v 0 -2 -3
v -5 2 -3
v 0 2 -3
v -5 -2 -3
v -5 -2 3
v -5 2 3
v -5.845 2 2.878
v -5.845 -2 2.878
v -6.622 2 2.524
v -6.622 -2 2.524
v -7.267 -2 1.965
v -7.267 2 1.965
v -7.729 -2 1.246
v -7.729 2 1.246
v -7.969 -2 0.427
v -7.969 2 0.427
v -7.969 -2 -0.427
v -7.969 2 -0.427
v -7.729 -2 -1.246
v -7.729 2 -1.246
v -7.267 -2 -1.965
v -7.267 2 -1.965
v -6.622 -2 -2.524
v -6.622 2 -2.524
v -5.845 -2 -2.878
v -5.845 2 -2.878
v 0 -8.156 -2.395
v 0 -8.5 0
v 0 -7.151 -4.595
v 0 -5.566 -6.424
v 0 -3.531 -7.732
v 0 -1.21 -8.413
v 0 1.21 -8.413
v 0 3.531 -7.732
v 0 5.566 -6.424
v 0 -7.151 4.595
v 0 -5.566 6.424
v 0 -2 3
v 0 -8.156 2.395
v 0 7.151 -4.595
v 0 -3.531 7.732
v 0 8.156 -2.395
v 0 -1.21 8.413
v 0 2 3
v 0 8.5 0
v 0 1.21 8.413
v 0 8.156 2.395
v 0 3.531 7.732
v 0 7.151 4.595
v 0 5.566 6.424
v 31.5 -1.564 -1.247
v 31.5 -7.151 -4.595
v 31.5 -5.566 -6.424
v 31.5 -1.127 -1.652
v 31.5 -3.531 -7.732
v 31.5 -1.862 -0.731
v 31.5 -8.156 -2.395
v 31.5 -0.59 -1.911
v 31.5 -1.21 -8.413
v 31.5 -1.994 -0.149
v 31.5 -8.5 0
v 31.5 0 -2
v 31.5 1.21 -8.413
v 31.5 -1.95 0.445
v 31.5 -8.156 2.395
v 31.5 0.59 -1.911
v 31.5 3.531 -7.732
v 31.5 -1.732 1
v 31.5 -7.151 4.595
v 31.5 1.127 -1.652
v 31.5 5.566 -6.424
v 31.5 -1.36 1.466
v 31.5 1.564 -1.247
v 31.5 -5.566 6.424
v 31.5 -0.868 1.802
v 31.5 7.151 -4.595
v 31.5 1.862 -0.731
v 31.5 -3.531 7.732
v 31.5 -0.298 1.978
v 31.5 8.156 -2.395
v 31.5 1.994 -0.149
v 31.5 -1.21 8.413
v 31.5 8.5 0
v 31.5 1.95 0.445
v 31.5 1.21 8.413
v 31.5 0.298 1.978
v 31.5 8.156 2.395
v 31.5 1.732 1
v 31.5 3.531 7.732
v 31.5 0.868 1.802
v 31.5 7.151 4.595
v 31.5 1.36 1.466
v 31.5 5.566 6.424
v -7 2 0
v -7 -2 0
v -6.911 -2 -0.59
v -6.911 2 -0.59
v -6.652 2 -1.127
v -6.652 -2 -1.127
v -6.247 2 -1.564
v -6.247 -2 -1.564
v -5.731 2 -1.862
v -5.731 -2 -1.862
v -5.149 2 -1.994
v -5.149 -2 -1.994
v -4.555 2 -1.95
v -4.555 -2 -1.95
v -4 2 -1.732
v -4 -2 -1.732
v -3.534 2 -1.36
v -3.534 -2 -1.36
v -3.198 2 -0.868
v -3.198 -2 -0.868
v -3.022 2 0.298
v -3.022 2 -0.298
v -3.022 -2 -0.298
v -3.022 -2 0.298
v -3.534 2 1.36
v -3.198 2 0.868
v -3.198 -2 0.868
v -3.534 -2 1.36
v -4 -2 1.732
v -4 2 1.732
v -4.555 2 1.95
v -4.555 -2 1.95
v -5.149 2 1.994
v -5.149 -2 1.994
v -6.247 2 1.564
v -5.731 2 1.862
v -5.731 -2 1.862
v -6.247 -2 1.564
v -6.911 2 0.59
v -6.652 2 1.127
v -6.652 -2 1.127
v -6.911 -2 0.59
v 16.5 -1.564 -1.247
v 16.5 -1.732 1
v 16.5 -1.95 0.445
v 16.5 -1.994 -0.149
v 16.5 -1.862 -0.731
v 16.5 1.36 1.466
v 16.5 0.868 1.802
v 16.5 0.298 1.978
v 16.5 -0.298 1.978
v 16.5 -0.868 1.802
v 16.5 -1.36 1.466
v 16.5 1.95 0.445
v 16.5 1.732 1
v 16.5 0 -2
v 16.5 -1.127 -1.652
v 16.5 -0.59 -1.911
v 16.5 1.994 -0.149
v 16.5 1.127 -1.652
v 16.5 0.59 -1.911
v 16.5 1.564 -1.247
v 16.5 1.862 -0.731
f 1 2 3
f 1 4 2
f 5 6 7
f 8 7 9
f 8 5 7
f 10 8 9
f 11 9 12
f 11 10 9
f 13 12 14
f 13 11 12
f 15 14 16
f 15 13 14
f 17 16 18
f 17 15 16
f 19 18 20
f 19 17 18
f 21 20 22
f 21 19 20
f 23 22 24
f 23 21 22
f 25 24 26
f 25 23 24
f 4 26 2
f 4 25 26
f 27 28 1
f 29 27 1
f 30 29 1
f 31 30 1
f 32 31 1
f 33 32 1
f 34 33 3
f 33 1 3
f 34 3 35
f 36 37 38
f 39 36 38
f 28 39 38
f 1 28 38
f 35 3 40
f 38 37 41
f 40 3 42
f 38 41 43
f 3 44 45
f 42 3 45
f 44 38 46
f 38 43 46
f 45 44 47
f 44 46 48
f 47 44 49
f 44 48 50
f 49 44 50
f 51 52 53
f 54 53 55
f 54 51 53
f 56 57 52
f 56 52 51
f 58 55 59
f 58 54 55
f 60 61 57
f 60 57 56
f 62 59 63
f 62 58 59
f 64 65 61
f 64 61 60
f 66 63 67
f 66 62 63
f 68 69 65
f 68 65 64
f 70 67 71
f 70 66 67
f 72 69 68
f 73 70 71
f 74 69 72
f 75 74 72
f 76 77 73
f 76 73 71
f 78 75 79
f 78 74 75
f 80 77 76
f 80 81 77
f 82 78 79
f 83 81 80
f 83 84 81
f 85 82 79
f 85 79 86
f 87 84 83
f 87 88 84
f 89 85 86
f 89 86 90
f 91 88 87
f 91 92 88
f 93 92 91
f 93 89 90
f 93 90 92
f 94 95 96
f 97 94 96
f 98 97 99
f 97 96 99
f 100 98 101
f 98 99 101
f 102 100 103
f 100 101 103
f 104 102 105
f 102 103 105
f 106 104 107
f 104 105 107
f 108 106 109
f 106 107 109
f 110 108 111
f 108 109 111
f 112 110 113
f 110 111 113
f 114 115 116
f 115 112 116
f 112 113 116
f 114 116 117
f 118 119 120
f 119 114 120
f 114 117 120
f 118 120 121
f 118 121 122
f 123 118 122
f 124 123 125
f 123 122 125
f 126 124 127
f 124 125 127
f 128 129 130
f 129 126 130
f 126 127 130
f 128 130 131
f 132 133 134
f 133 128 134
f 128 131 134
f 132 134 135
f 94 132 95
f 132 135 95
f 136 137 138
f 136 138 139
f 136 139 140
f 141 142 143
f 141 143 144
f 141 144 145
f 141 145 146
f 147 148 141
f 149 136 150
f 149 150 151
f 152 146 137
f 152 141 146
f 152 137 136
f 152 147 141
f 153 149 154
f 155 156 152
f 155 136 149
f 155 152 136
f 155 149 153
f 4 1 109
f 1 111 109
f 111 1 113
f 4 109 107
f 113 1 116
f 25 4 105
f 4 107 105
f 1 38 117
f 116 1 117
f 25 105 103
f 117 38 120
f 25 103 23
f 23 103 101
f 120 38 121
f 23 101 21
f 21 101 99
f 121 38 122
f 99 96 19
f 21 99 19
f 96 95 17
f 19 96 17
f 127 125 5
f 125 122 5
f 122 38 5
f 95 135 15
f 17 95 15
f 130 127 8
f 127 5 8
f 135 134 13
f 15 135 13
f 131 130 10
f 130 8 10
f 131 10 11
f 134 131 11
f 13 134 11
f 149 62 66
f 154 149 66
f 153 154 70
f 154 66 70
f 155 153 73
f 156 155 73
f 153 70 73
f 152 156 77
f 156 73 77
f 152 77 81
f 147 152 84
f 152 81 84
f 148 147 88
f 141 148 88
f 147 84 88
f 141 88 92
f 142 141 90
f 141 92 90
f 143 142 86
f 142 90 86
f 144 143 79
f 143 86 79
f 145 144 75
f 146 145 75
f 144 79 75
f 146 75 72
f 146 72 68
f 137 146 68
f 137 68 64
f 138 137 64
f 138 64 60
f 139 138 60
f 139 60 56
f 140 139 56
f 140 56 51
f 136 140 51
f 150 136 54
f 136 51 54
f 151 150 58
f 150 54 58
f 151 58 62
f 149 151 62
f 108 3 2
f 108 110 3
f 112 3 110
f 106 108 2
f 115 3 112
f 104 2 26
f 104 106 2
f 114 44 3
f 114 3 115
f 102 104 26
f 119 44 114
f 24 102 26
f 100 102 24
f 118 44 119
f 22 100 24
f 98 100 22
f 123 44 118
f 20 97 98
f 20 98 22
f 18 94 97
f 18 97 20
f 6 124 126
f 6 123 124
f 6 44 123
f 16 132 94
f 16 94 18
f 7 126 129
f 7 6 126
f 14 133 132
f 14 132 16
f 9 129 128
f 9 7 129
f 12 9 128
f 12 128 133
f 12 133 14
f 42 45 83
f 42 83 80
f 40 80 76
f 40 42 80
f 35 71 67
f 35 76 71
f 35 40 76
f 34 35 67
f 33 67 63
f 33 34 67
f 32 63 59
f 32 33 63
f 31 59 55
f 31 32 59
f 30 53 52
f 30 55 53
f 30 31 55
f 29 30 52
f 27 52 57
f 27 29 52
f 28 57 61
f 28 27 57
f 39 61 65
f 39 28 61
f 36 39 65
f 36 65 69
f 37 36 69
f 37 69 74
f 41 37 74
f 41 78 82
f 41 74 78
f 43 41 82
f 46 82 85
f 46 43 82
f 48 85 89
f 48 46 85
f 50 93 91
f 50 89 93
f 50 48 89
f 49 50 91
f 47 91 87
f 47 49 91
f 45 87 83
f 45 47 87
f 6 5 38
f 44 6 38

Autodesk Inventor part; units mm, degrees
ref_plane "YZ Plane" through (0, 0, 0) normal (1, 0, 0) x (0, 1, 0)
ref_plane "XZ Plane" through (0, 0, 0) normal (0, 1, 0) x (-1, 0, 0)
ref_plane "XY Plane" through (0, 0, 0) normal (0, 0, 1) x (1, 0, 0)
sketch "スケッチ1" plane through (0, 0, 0) normal (1, 0, 0) x (0, 1, 0)
  circle A0 centre (0, 0) radius 8.5
  dimension "d0" = 17
extrude "押し出し1" add sketch "スケッチ1" along normal blind 31.5
sketch "スケッチ2" plane through (0, 0, 0) normal (0, 1, 0) x (-1, 0, 0)
  circle A0 centre (5, 0) radius 2
  circle A1 centre (5, 0) radius 3
  line L0 (0, 0) -> (0, 5.5308)
  line L1 (0, 5.5308) -> (0, -7.9673)
  line L2 (5, 3) -> (0, 3)
  line L3 (5, -3) -> (0, -3)
  dimension "d3" = 4
  dimension "d4" = 5
  dimension "d5" = 6
extrude "押し出し2" add sketch "スケッチ2" along normal mid plane 4
sketch "スケッチ3" plane through (31.5, 0, 0) normal (1, 0, 0) x (0, 0, -1)
  circle A0 centre (0, 0) radius 2
  dimension "d8" = 4
extrude "押し出し3" cut sketch "スケッチ3" against normal blind 15
properties part number "black-suspension-under" material "ABS プラスチック"
